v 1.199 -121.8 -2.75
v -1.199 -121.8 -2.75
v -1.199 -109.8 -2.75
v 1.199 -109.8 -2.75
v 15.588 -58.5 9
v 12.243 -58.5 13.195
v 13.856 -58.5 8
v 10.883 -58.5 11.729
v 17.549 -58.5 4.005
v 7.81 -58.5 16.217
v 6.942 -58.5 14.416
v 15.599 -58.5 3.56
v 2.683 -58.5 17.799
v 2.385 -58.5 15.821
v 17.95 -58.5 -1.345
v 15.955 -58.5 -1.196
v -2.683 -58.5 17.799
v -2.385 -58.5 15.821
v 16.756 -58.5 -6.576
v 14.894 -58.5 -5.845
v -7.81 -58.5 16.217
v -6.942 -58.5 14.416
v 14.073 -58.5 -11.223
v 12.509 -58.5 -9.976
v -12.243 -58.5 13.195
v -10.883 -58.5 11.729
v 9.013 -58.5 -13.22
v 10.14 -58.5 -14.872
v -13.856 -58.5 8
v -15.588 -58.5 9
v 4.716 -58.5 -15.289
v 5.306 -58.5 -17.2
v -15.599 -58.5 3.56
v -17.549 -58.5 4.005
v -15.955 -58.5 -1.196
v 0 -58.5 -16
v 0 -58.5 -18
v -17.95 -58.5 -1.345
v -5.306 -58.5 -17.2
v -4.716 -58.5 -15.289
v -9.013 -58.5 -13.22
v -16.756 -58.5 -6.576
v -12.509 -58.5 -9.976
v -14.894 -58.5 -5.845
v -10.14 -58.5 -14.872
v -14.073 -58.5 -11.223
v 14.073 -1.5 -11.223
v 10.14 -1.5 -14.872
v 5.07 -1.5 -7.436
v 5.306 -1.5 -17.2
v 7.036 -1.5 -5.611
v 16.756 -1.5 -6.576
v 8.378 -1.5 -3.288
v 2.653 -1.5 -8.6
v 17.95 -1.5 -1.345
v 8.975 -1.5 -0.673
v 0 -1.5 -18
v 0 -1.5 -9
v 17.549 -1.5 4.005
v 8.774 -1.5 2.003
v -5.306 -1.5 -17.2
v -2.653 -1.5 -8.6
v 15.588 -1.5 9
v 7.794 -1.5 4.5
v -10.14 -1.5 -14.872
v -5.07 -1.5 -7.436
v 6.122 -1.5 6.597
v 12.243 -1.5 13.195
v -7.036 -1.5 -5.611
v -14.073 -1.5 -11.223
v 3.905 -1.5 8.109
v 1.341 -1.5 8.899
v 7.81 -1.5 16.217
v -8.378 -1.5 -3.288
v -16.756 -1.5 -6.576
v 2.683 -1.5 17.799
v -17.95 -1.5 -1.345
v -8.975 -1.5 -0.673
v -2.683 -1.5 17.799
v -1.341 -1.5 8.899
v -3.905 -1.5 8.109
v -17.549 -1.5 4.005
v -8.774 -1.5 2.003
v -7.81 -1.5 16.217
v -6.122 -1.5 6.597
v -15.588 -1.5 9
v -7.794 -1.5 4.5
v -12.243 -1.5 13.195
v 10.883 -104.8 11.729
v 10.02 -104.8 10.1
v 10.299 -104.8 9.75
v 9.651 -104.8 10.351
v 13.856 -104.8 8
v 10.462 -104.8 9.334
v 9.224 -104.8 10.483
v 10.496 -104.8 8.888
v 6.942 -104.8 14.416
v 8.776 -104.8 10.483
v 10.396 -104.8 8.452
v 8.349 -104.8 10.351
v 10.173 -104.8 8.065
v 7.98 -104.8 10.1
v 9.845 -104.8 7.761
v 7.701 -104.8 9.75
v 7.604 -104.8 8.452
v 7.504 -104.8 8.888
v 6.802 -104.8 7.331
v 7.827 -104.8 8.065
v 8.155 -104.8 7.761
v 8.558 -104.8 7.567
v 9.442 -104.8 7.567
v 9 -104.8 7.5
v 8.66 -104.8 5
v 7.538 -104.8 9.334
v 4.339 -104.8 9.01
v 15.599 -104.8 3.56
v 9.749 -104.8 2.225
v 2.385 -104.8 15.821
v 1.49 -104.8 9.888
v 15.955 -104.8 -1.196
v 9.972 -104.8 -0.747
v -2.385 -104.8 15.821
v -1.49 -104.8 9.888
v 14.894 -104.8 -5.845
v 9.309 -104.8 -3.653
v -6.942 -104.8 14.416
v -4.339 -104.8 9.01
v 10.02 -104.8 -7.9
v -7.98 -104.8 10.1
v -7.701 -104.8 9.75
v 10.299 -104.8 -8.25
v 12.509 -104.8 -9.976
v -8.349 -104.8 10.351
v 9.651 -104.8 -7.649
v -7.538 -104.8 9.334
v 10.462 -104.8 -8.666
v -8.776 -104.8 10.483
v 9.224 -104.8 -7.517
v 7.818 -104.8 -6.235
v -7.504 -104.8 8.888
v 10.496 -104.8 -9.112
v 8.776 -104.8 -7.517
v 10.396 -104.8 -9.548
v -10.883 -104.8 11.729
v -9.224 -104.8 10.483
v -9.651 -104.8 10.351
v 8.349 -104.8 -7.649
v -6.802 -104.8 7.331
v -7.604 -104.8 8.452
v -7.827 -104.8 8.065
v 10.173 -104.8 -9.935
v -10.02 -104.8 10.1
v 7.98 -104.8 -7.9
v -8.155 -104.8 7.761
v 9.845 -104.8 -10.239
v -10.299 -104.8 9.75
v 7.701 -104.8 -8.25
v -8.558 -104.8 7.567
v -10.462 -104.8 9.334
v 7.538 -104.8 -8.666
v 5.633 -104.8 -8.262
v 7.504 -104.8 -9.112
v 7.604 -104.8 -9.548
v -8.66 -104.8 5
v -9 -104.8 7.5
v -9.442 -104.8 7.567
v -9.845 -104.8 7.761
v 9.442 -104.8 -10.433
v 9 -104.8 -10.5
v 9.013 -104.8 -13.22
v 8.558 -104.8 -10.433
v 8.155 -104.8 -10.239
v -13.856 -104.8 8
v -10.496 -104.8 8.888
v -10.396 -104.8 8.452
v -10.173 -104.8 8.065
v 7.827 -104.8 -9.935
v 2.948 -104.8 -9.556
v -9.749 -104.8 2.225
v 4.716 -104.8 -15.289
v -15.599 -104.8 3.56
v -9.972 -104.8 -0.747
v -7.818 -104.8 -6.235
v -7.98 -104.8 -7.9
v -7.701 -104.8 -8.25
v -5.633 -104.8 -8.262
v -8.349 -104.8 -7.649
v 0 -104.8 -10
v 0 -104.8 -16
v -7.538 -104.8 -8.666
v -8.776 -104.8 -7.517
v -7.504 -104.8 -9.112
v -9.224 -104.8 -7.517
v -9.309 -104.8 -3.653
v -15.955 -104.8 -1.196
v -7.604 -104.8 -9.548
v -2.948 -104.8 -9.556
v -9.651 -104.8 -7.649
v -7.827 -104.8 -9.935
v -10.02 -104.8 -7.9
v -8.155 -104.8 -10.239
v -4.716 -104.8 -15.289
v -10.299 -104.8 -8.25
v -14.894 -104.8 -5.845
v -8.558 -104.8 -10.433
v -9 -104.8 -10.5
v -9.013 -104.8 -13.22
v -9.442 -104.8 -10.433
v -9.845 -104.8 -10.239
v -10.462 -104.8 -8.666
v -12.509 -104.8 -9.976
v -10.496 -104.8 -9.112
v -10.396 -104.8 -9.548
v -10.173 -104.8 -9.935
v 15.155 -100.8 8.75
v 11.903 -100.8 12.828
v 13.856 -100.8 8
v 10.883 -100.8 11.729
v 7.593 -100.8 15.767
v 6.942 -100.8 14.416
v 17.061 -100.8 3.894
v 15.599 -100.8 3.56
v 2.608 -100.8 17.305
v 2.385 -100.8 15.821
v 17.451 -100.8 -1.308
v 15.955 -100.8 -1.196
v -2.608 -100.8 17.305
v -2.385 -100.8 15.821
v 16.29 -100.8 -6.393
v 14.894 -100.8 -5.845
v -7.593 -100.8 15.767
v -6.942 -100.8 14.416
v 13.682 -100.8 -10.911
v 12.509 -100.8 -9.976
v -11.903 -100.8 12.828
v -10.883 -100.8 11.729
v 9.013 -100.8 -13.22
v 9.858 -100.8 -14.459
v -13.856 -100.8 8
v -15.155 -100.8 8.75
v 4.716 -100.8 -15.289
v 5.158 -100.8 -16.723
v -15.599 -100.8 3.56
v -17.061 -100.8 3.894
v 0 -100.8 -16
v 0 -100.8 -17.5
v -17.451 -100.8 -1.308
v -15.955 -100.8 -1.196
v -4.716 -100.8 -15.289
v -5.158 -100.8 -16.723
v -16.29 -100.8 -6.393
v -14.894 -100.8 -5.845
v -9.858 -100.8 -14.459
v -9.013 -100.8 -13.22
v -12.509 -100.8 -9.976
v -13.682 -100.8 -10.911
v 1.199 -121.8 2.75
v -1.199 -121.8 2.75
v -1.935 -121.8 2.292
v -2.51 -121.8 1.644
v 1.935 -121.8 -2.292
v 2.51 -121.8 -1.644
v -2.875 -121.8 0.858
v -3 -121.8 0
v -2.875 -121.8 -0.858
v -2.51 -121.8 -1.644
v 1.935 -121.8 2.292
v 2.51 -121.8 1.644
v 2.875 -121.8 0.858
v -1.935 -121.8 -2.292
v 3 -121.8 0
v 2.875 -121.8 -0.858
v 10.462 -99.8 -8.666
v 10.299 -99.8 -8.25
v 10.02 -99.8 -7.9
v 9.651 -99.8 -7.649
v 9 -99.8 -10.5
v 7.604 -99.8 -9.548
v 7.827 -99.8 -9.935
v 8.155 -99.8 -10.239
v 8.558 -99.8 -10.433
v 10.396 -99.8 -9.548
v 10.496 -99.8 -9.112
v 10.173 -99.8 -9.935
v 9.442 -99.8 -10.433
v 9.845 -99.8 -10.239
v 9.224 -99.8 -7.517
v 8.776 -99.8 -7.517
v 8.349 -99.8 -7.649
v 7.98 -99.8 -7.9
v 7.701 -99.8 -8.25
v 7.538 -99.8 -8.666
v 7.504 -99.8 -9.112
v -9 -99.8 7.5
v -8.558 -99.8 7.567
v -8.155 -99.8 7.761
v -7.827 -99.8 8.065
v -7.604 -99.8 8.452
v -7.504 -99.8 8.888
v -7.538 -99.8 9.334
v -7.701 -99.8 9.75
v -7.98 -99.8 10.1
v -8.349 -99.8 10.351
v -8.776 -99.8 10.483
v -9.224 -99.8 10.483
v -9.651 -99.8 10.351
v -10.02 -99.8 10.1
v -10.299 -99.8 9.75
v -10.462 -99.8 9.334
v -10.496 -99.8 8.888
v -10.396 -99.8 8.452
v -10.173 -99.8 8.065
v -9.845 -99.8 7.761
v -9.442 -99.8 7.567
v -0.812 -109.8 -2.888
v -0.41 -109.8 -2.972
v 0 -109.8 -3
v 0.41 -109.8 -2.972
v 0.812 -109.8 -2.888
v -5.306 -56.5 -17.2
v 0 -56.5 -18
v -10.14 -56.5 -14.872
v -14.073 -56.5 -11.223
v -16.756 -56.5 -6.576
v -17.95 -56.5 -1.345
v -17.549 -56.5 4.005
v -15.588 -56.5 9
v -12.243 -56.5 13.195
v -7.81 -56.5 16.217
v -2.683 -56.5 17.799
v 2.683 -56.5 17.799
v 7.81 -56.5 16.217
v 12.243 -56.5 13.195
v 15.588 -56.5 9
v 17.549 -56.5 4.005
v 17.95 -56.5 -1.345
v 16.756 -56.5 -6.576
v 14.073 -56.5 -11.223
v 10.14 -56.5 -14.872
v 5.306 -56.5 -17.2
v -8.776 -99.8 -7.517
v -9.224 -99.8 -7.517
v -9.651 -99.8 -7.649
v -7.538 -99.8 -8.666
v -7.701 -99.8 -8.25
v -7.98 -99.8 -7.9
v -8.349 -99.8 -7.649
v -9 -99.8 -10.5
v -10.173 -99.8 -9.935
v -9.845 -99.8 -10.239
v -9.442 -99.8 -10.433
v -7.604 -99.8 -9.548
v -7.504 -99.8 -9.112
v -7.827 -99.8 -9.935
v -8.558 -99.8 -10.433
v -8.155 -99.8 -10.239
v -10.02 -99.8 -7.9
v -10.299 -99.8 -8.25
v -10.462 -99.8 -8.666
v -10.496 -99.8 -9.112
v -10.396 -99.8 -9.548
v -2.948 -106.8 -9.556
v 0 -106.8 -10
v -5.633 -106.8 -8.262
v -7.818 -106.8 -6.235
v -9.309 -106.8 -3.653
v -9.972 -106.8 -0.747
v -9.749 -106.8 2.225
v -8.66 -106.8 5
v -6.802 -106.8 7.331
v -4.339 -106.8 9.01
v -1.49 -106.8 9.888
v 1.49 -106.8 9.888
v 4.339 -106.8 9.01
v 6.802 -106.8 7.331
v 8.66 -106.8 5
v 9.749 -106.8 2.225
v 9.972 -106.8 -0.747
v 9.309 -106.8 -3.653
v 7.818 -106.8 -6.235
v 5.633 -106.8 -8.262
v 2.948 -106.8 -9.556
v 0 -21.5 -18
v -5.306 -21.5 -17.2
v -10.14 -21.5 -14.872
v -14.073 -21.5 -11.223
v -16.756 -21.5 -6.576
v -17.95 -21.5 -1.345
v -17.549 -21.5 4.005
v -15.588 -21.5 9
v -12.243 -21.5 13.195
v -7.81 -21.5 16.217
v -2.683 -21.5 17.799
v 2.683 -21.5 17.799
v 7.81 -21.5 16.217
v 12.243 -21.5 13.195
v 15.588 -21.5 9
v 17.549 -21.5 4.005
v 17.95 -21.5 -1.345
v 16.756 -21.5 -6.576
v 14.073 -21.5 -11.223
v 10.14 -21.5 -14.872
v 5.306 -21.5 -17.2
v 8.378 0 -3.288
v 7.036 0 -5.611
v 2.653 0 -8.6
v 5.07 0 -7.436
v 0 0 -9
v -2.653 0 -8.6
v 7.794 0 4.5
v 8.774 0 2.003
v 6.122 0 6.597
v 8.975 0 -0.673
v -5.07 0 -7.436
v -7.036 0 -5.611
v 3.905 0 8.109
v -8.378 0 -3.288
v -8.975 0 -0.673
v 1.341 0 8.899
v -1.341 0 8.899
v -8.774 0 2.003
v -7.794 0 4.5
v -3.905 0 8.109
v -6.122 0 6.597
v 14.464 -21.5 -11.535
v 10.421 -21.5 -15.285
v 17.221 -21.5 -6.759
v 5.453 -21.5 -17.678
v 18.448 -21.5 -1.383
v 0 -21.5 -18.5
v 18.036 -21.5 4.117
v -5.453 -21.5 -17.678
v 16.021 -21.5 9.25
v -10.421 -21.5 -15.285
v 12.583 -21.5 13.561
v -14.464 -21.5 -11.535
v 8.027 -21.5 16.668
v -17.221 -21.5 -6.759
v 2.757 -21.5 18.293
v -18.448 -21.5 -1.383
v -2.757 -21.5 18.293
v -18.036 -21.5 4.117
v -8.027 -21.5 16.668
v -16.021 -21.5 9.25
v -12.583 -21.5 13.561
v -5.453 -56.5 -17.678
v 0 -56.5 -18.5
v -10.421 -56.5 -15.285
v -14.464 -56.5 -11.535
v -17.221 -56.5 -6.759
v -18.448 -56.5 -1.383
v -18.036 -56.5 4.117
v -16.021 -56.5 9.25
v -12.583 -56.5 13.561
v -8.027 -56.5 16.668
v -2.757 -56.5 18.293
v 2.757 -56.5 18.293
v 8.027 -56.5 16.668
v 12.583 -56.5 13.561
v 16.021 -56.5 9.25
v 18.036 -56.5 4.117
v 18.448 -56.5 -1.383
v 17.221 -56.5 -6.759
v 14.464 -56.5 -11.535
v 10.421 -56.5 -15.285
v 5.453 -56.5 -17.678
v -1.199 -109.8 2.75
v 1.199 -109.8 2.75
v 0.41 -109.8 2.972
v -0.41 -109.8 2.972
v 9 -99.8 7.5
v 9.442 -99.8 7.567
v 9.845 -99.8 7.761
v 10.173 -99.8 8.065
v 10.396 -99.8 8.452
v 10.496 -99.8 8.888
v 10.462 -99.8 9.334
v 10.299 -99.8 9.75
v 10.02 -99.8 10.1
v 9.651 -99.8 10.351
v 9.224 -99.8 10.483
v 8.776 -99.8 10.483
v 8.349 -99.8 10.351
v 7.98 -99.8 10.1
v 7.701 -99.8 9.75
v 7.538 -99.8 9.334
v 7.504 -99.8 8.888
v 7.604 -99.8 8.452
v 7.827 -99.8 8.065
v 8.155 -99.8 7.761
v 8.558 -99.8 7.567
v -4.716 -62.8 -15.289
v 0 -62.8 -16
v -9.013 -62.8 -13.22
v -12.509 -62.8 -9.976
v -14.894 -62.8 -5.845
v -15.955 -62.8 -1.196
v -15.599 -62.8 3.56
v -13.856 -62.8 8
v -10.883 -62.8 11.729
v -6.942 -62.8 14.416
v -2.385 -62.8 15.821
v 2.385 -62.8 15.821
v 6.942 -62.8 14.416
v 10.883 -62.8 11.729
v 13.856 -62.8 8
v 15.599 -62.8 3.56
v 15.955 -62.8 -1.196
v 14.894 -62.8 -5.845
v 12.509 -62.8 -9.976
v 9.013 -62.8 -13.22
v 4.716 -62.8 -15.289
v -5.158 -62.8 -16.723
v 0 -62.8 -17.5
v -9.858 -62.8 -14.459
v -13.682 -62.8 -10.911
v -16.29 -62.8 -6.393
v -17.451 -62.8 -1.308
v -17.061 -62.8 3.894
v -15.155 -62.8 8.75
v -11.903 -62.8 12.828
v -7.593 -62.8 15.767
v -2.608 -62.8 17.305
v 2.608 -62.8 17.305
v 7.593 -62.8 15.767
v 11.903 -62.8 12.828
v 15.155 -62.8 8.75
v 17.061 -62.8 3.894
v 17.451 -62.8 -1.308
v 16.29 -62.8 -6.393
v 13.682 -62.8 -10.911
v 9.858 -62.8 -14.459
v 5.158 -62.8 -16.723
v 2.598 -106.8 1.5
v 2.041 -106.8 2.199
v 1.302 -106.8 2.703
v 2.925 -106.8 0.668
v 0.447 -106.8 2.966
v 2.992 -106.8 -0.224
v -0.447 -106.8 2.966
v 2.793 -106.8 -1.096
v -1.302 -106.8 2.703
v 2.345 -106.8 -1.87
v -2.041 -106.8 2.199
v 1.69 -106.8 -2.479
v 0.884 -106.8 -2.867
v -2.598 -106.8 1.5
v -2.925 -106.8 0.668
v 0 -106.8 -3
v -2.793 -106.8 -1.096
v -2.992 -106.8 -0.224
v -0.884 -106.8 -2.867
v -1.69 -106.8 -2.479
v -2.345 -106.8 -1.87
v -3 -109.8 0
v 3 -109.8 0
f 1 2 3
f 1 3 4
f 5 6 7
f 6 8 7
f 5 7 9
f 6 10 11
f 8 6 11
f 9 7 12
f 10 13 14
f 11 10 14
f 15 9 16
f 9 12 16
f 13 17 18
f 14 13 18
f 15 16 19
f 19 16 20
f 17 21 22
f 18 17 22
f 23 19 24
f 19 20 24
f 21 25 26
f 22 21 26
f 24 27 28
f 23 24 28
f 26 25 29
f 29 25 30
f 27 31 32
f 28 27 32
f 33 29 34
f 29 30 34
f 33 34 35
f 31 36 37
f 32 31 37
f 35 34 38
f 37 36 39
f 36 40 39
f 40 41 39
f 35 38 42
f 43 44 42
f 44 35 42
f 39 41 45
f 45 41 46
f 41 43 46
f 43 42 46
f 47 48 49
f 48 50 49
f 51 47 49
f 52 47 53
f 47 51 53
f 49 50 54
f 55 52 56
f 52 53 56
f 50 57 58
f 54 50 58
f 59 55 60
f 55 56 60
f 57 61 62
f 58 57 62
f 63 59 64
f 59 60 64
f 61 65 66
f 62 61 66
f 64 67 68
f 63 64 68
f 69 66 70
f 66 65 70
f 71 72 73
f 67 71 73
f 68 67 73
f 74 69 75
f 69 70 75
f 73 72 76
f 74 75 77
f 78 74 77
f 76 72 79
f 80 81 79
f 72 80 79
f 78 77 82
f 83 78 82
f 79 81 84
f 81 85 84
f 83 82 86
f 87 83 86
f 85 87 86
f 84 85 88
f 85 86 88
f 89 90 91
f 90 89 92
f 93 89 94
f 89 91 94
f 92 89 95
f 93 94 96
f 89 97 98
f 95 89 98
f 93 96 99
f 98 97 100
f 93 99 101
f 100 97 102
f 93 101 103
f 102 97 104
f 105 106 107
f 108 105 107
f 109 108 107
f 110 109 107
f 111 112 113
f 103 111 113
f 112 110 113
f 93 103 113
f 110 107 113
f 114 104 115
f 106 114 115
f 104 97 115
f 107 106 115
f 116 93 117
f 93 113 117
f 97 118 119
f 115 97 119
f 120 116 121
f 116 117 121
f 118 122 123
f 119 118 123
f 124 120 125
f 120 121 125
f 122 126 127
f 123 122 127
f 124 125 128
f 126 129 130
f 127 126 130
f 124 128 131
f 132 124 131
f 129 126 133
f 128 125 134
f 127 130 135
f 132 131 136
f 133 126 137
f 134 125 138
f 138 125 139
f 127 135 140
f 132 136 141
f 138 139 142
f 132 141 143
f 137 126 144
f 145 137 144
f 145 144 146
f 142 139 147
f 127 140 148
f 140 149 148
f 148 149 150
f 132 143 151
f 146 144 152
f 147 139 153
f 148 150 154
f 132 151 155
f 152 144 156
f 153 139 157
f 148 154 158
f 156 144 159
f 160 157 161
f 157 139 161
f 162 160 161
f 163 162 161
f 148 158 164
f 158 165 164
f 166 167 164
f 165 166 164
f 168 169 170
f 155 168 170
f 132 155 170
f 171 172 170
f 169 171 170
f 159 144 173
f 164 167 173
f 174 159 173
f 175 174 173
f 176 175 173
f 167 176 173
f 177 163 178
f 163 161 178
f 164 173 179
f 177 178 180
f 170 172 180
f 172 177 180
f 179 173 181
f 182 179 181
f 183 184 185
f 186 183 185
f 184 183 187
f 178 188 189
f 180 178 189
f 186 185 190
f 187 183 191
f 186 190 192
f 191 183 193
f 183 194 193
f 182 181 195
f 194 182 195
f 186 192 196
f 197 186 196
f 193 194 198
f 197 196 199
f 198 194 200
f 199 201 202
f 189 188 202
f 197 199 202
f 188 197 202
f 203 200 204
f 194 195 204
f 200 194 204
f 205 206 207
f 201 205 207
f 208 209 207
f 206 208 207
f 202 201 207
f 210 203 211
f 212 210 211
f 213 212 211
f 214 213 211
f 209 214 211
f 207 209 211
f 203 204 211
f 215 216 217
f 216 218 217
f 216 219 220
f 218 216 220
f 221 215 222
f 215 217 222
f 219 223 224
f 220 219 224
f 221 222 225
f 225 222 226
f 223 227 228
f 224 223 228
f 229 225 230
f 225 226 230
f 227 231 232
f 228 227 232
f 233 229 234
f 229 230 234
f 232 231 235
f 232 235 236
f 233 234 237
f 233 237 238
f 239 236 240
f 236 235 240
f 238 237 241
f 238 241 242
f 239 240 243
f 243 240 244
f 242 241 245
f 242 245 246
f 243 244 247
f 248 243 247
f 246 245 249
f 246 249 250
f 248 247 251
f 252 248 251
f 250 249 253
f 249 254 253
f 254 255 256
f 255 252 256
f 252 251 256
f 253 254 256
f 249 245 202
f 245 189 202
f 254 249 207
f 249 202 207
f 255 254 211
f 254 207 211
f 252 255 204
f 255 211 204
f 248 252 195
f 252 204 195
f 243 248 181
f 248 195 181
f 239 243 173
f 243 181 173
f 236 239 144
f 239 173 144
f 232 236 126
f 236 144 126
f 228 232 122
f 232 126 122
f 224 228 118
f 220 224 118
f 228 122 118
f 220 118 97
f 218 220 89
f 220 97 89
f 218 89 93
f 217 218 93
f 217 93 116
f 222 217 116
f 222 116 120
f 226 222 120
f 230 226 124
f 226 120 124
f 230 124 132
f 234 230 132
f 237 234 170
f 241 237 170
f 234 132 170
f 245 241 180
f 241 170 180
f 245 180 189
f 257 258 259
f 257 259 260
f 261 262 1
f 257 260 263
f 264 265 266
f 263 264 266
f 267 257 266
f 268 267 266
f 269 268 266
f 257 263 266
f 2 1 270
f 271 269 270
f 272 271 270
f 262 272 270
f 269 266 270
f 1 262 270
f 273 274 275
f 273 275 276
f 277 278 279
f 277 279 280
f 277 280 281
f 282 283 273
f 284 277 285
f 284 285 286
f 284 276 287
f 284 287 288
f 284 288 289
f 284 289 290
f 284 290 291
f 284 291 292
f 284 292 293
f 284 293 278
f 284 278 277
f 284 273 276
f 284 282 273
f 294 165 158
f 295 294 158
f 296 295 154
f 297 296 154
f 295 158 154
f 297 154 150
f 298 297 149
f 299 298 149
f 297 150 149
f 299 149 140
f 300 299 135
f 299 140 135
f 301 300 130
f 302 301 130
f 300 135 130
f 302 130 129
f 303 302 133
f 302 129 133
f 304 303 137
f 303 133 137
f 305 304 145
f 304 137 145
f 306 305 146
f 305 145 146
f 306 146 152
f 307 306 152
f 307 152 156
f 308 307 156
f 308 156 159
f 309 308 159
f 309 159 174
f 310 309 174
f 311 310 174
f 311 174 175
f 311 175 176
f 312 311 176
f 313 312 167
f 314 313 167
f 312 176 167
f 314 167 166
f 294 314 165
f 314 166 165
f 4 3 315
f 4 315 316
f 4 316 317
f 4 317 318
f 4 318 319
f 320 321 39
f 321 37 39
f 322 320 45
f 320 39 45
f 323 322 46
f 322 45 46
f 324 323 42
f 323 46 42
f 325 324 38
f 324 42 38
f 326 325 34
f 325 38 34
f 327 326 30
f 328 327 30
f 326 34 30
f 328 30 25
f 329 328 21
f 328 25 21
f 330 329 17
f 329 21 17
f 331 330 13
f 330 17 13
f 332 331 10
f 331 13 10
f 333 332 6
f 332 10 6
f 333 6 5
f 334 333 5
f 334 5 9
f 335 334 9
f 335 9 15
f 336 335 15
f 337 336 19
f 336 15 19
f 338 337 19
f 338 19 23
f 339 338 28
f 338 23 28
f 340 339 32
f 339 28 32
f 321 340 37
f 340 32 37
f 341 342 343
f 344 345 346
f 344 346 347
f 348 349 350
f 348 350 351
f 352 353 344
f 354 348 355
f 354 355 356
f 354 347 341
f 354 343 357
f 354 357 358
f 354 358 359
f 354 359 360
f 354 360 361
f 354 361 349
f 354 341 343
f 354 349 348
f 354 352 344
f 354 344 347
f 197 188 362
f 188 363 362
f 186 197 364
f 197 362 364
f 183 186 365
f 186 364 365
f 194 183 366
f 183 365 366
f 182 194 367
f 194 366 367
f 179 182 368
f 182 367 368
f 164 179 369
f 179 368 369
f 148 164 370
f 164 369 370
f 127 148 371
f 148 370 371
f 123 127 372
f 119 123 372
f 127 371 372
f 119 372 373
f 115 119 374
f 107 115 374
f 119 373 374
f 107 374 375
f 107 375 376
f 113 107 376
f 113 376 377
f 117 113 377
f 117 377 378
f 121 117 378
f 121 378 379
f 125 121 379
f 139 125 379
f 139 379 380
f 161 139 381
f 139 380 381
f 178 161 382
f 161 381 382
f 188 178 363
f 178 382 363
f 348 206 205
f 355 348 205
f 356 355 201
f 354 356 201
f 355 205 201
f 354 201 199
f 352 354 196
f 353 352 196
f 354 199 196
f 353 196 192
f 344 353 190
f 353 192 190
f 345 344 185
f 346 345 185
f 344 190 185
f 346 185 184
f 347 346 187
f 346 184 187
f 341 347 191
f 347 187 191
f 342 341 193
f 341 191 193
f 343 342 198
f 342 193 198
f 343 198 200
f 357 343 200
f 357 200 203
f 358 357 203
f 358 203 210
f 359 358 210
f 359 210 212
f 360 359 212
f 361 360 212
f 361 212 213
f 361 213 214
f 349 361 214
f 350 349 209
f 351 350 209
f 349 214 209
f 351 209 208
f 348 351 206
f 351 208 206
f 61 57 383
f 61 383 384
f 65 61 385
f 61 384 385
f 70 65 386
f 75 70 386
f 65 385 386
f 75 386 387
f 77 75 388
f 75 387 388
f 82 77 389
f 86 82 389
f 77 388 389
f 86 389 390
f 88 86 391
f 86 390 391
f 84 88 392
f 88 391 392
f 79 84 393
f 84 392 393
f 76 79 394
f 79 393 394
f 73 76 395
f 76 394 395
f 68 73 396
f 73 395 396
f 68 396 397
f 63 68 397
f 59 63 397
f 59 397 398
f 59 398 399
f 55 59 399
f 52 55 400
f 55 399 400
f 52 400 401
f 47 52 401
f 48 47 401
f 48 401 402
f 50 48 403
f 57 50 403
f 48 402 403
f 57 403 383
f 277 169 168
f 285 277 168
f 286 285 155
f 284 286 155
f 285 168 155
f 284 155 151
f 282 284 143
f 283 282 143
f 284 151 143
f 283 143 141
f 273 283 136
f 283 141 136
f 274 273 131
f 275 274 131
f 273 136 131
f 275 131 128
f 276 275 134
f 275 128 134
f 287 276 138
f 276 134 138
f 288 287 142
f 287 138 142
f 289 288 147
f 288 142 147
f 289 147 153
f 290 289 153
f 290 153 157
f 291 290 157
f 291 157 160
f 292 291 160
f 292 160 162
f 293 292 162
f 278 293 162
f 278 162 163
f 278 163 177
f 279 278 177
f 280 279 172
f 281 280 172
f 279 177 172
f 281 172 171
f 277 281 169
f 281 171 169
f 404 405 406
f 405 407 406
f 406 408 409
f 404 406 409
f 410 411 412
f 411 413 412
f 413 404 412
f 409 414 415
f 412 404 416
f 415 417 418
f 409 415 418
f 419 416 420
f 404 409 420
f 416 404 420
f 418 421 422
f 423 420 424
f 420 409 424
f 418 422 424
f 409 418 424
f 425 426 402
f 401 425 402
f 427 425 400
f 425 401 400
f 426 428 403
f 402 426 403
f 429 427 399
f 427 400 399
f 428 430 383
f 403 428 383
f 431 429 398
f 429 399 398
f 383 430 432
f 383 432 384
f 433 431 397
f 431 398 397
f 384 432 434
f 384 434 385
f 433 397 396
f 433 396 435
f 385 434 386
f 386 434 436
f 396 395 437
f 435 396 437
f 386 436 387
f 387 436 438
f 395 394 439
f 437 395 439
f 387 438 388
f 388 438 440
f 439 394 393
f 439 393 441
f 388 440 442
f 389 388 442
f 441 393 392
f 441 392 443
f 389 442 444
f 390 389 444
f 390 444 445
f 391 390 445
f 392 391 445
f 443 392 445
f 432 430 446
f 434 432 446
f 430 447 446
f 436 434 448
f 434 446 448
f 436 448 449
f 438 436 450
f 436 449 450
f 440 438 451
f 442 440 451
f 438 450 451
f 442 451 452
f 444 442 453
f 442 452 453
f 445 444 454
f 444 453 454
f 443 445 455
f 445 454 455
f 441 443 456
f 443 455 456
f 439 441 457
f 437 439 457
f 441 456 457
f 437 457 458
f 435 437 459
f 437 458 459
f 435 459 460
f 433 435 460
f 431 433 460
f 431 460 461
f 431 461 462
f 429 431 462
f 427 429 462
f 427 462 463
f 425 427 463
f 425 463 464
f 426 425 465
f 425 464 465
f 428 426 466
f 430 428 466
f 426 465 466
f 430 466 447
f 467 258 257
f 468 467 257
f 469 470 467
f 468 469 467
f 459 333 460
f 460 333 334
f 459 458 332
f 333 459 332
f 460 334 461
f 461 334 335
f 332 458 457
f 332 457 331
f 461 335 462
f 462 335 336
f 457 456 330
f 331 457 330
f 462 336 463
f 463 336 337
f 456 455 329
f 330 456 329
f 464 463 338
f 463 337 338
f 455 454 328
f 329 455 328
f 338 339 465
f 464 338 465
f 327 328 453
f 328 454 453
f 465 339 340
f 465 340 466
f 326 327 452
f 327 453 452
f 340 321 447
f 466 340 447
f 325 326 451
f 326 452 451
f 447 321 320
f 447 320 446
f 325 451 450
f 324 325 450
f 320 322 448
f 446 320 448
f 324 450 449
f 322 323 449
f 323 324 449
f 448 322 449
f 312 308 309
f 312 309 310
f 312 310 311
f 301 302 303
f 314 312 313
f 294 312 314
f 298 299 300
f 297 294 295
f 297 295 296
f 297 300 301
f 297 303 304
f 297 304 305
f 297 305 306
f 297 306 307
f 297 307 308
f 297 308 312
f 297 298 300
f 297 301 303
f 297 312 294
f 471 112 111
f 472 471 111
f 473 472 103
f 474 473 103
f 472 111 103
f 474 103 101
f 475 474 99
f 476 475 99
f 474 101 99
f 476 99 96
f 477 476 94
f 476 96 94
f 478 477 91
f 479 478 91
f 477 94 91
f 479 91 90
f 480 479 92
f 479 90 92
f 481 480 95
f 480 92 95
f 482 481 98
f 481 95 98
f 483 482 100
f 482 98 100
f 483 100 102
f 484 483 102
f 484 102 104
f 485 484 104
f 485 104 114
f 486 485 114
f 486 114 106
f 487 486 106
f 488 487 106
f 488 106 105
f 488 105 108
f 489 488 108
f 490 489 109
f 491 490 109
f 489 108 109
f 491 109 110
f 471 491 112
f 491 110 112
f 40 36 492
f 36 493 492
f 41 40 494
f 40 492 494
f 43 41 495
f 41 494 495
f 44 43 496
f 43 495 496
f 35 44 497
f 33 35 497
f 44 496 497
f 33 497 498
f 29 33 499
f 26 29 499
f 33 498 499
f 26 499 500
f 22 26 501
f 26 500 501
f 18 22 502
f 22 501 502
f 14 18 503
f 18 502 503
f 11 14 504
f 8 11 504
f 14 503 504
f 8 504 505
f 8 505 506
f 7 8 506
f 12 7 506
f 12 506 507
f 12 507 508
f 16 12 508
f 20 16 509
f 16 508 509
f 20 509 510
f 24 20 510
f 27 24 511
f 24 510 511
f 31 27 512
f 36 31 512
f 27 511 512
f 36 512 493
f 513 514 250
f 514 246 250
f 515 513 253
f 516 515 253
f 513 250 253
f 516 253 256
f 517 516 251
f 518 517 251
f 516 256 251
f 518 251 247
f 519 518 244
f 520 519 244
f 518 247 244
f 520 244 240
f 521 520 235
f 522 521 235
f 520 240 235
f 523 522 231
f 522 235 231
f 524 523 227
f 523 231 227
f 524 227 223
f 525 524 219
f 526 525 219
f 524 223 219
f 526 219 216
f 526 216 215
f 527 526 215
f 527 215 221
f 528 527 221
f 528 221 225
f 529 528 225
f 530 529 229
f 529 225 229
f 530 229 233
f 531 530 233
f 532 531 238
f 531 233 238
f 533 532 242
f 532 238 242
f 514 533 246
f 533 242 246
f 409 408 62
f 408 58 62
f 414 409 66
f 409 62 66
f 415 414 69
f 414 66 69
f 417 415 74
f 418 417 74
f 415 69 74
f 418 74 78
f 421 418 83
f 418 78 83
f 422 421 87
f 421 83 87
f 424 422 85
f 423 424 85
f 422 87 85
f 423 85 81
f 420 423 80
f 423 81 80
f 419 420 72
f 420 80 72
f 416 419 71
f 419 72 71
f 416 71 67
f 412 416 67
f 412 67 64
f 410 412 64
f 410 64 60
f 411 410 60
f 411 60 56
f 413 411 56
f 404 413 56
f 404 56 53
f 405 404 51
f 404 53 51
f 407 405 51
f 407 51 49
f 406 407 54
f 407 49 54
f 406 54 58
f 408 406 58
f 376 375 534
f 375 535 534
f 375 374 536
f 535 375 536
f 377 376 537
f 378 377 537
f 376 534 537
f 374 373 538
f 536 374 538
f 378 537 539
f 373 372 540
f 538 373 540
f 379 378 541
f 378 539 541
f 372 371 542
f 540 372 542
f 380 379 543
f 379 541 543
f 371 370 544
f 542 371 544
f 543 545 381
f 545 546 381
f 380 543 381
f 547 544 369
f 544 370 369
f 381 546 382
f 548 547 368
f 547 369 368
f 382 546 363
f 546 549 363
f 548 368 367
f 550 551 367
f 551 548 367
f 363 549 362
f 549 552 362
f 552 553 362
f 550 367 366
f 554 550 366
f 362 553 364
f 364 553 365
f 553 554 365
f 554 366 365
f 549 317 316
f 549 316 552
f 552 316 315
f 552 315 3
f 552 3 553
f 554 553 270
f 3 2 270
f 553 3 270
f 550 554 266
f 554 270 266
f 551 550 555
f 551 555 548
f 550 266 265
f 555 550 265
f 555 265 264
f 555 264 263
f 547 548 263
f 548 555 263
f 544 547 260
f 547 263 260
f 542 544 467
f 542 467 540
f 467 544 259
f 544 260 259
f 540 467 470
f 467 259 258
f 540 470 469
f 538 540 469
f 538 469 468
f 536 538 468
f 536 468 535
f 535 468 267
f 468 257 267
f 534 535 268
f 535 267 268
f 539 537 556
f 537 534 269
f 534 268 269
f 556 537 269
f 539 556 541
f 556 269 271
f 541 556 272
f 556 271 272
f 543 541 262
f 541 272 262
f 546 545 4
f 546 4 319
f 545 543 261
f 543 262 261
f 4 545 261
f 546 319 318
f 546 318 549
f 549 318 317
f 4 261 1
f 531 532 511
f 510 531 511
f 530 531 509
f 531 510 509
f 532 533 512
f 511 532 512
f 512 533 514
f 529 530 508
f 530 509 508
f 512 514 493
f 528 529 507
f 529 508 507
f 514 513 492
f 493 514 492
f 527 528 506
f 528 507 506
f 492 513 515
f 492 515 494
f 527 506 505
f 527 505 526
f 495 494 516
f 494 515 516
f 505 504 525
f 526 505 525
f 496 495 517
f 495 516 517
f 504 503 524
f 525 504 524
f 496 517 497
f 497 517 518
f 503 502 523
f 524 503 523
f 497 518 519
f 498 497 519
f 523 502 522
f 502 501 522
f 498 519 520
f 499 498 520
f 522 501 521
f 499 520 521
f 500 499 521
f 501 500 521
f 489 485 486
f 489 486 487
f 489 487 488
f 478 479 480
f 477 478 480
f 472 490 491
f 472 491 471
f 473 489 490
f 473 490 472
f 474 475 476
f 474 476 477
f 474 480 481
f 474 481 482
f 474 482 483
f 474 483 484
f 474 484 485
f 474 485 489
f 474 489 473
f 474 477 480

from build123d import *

# Parameters (mm, degrees)
SKETCH_4_OUTSIDE_W   = 65.512
SKETCH_4_OUTSIDE_H   = 65.512
SKETCH_4_OUTSIDE_W_2 = 6
SKETCH_4_OUTSIDE_H_2 = 5.5
CUT_EXTRUDE_2_DEPTH  = 12
SKETCH_5_R           = 1.5
CUT_EXTRUDE_3_DEPTH  = 5


with BuildPart() as part:
    # Эскиз1 → Повернуть1 (revolve)
    with BuildSketch(Plane.XY, mode=Mode.PRIVATE) as revolve_1_sk:
        Polygon((0, 0), (-9, 0), (-9, -1.5), (-18, -1.5), (-18, -21.5), (-18.5, -21.5), (-18.5, -56.5), (-18, -56.5), (-18, -58.5), (-16, -58.5), (-16, -62.8), (-17.5, -62.8), (-17.5, -100.8), (-16, -100.8), (-16, -104.8), (-10, -104.8), (-10, -106.8), (-3, -106.8), (-3, -121.8), (0, -121.8), align=None)
    revolve(revolve_1_sk.sketch.rotate(Axis((0, -180.909291234, 0), (0, 1, 0)), 270), axis=Axis((0, -180.909291234, 0), (0, 1, 0)))

    # Эскиз4 outside → Вырез-Вытянуть2 (cut)
    with BuildSketch(Plane.XZ.offset(121.8)):
        Rectangle(SKETCH_4_OUTSIDE_W, SKETCH_4_OUTSIDE_H)
        Rectangle(SKETCH_4_OUTSIDE_W_2, SKETCH_4_OUTSIDE_H_2, mode=Mode.SUBTRACT)
    extrude(amount=-CUT_EXTRUDE_2_DEPTH, mode=Mode.SUBTRACT)

    # Эскиз5 → Вырез-Вытянуть3 (cut)
    with BuildSketch(Plane.XZ.offset(104.8)):
        with Locations(Location((-9, 9, 0), (0, 0, 270))):
            Circle(SKETCH_5_R)
        with Locations(Location((9, 9, 0), (0, 0, 270))):
            Circle(SKETCH_5_R)
        with Locations(Location((9, -9, 0), (0, 0, 270))):
            Circle(SKETCH_5_R)
        with Locations(Location((-9, -9, 0), (0, 0, 270))):
            Circle(SKETCH_5_R)
    extrude(amount=-CUT_EXTRUDE_3_DEPTH, mode=Mode.SUBTRACT)


solid = part.part
